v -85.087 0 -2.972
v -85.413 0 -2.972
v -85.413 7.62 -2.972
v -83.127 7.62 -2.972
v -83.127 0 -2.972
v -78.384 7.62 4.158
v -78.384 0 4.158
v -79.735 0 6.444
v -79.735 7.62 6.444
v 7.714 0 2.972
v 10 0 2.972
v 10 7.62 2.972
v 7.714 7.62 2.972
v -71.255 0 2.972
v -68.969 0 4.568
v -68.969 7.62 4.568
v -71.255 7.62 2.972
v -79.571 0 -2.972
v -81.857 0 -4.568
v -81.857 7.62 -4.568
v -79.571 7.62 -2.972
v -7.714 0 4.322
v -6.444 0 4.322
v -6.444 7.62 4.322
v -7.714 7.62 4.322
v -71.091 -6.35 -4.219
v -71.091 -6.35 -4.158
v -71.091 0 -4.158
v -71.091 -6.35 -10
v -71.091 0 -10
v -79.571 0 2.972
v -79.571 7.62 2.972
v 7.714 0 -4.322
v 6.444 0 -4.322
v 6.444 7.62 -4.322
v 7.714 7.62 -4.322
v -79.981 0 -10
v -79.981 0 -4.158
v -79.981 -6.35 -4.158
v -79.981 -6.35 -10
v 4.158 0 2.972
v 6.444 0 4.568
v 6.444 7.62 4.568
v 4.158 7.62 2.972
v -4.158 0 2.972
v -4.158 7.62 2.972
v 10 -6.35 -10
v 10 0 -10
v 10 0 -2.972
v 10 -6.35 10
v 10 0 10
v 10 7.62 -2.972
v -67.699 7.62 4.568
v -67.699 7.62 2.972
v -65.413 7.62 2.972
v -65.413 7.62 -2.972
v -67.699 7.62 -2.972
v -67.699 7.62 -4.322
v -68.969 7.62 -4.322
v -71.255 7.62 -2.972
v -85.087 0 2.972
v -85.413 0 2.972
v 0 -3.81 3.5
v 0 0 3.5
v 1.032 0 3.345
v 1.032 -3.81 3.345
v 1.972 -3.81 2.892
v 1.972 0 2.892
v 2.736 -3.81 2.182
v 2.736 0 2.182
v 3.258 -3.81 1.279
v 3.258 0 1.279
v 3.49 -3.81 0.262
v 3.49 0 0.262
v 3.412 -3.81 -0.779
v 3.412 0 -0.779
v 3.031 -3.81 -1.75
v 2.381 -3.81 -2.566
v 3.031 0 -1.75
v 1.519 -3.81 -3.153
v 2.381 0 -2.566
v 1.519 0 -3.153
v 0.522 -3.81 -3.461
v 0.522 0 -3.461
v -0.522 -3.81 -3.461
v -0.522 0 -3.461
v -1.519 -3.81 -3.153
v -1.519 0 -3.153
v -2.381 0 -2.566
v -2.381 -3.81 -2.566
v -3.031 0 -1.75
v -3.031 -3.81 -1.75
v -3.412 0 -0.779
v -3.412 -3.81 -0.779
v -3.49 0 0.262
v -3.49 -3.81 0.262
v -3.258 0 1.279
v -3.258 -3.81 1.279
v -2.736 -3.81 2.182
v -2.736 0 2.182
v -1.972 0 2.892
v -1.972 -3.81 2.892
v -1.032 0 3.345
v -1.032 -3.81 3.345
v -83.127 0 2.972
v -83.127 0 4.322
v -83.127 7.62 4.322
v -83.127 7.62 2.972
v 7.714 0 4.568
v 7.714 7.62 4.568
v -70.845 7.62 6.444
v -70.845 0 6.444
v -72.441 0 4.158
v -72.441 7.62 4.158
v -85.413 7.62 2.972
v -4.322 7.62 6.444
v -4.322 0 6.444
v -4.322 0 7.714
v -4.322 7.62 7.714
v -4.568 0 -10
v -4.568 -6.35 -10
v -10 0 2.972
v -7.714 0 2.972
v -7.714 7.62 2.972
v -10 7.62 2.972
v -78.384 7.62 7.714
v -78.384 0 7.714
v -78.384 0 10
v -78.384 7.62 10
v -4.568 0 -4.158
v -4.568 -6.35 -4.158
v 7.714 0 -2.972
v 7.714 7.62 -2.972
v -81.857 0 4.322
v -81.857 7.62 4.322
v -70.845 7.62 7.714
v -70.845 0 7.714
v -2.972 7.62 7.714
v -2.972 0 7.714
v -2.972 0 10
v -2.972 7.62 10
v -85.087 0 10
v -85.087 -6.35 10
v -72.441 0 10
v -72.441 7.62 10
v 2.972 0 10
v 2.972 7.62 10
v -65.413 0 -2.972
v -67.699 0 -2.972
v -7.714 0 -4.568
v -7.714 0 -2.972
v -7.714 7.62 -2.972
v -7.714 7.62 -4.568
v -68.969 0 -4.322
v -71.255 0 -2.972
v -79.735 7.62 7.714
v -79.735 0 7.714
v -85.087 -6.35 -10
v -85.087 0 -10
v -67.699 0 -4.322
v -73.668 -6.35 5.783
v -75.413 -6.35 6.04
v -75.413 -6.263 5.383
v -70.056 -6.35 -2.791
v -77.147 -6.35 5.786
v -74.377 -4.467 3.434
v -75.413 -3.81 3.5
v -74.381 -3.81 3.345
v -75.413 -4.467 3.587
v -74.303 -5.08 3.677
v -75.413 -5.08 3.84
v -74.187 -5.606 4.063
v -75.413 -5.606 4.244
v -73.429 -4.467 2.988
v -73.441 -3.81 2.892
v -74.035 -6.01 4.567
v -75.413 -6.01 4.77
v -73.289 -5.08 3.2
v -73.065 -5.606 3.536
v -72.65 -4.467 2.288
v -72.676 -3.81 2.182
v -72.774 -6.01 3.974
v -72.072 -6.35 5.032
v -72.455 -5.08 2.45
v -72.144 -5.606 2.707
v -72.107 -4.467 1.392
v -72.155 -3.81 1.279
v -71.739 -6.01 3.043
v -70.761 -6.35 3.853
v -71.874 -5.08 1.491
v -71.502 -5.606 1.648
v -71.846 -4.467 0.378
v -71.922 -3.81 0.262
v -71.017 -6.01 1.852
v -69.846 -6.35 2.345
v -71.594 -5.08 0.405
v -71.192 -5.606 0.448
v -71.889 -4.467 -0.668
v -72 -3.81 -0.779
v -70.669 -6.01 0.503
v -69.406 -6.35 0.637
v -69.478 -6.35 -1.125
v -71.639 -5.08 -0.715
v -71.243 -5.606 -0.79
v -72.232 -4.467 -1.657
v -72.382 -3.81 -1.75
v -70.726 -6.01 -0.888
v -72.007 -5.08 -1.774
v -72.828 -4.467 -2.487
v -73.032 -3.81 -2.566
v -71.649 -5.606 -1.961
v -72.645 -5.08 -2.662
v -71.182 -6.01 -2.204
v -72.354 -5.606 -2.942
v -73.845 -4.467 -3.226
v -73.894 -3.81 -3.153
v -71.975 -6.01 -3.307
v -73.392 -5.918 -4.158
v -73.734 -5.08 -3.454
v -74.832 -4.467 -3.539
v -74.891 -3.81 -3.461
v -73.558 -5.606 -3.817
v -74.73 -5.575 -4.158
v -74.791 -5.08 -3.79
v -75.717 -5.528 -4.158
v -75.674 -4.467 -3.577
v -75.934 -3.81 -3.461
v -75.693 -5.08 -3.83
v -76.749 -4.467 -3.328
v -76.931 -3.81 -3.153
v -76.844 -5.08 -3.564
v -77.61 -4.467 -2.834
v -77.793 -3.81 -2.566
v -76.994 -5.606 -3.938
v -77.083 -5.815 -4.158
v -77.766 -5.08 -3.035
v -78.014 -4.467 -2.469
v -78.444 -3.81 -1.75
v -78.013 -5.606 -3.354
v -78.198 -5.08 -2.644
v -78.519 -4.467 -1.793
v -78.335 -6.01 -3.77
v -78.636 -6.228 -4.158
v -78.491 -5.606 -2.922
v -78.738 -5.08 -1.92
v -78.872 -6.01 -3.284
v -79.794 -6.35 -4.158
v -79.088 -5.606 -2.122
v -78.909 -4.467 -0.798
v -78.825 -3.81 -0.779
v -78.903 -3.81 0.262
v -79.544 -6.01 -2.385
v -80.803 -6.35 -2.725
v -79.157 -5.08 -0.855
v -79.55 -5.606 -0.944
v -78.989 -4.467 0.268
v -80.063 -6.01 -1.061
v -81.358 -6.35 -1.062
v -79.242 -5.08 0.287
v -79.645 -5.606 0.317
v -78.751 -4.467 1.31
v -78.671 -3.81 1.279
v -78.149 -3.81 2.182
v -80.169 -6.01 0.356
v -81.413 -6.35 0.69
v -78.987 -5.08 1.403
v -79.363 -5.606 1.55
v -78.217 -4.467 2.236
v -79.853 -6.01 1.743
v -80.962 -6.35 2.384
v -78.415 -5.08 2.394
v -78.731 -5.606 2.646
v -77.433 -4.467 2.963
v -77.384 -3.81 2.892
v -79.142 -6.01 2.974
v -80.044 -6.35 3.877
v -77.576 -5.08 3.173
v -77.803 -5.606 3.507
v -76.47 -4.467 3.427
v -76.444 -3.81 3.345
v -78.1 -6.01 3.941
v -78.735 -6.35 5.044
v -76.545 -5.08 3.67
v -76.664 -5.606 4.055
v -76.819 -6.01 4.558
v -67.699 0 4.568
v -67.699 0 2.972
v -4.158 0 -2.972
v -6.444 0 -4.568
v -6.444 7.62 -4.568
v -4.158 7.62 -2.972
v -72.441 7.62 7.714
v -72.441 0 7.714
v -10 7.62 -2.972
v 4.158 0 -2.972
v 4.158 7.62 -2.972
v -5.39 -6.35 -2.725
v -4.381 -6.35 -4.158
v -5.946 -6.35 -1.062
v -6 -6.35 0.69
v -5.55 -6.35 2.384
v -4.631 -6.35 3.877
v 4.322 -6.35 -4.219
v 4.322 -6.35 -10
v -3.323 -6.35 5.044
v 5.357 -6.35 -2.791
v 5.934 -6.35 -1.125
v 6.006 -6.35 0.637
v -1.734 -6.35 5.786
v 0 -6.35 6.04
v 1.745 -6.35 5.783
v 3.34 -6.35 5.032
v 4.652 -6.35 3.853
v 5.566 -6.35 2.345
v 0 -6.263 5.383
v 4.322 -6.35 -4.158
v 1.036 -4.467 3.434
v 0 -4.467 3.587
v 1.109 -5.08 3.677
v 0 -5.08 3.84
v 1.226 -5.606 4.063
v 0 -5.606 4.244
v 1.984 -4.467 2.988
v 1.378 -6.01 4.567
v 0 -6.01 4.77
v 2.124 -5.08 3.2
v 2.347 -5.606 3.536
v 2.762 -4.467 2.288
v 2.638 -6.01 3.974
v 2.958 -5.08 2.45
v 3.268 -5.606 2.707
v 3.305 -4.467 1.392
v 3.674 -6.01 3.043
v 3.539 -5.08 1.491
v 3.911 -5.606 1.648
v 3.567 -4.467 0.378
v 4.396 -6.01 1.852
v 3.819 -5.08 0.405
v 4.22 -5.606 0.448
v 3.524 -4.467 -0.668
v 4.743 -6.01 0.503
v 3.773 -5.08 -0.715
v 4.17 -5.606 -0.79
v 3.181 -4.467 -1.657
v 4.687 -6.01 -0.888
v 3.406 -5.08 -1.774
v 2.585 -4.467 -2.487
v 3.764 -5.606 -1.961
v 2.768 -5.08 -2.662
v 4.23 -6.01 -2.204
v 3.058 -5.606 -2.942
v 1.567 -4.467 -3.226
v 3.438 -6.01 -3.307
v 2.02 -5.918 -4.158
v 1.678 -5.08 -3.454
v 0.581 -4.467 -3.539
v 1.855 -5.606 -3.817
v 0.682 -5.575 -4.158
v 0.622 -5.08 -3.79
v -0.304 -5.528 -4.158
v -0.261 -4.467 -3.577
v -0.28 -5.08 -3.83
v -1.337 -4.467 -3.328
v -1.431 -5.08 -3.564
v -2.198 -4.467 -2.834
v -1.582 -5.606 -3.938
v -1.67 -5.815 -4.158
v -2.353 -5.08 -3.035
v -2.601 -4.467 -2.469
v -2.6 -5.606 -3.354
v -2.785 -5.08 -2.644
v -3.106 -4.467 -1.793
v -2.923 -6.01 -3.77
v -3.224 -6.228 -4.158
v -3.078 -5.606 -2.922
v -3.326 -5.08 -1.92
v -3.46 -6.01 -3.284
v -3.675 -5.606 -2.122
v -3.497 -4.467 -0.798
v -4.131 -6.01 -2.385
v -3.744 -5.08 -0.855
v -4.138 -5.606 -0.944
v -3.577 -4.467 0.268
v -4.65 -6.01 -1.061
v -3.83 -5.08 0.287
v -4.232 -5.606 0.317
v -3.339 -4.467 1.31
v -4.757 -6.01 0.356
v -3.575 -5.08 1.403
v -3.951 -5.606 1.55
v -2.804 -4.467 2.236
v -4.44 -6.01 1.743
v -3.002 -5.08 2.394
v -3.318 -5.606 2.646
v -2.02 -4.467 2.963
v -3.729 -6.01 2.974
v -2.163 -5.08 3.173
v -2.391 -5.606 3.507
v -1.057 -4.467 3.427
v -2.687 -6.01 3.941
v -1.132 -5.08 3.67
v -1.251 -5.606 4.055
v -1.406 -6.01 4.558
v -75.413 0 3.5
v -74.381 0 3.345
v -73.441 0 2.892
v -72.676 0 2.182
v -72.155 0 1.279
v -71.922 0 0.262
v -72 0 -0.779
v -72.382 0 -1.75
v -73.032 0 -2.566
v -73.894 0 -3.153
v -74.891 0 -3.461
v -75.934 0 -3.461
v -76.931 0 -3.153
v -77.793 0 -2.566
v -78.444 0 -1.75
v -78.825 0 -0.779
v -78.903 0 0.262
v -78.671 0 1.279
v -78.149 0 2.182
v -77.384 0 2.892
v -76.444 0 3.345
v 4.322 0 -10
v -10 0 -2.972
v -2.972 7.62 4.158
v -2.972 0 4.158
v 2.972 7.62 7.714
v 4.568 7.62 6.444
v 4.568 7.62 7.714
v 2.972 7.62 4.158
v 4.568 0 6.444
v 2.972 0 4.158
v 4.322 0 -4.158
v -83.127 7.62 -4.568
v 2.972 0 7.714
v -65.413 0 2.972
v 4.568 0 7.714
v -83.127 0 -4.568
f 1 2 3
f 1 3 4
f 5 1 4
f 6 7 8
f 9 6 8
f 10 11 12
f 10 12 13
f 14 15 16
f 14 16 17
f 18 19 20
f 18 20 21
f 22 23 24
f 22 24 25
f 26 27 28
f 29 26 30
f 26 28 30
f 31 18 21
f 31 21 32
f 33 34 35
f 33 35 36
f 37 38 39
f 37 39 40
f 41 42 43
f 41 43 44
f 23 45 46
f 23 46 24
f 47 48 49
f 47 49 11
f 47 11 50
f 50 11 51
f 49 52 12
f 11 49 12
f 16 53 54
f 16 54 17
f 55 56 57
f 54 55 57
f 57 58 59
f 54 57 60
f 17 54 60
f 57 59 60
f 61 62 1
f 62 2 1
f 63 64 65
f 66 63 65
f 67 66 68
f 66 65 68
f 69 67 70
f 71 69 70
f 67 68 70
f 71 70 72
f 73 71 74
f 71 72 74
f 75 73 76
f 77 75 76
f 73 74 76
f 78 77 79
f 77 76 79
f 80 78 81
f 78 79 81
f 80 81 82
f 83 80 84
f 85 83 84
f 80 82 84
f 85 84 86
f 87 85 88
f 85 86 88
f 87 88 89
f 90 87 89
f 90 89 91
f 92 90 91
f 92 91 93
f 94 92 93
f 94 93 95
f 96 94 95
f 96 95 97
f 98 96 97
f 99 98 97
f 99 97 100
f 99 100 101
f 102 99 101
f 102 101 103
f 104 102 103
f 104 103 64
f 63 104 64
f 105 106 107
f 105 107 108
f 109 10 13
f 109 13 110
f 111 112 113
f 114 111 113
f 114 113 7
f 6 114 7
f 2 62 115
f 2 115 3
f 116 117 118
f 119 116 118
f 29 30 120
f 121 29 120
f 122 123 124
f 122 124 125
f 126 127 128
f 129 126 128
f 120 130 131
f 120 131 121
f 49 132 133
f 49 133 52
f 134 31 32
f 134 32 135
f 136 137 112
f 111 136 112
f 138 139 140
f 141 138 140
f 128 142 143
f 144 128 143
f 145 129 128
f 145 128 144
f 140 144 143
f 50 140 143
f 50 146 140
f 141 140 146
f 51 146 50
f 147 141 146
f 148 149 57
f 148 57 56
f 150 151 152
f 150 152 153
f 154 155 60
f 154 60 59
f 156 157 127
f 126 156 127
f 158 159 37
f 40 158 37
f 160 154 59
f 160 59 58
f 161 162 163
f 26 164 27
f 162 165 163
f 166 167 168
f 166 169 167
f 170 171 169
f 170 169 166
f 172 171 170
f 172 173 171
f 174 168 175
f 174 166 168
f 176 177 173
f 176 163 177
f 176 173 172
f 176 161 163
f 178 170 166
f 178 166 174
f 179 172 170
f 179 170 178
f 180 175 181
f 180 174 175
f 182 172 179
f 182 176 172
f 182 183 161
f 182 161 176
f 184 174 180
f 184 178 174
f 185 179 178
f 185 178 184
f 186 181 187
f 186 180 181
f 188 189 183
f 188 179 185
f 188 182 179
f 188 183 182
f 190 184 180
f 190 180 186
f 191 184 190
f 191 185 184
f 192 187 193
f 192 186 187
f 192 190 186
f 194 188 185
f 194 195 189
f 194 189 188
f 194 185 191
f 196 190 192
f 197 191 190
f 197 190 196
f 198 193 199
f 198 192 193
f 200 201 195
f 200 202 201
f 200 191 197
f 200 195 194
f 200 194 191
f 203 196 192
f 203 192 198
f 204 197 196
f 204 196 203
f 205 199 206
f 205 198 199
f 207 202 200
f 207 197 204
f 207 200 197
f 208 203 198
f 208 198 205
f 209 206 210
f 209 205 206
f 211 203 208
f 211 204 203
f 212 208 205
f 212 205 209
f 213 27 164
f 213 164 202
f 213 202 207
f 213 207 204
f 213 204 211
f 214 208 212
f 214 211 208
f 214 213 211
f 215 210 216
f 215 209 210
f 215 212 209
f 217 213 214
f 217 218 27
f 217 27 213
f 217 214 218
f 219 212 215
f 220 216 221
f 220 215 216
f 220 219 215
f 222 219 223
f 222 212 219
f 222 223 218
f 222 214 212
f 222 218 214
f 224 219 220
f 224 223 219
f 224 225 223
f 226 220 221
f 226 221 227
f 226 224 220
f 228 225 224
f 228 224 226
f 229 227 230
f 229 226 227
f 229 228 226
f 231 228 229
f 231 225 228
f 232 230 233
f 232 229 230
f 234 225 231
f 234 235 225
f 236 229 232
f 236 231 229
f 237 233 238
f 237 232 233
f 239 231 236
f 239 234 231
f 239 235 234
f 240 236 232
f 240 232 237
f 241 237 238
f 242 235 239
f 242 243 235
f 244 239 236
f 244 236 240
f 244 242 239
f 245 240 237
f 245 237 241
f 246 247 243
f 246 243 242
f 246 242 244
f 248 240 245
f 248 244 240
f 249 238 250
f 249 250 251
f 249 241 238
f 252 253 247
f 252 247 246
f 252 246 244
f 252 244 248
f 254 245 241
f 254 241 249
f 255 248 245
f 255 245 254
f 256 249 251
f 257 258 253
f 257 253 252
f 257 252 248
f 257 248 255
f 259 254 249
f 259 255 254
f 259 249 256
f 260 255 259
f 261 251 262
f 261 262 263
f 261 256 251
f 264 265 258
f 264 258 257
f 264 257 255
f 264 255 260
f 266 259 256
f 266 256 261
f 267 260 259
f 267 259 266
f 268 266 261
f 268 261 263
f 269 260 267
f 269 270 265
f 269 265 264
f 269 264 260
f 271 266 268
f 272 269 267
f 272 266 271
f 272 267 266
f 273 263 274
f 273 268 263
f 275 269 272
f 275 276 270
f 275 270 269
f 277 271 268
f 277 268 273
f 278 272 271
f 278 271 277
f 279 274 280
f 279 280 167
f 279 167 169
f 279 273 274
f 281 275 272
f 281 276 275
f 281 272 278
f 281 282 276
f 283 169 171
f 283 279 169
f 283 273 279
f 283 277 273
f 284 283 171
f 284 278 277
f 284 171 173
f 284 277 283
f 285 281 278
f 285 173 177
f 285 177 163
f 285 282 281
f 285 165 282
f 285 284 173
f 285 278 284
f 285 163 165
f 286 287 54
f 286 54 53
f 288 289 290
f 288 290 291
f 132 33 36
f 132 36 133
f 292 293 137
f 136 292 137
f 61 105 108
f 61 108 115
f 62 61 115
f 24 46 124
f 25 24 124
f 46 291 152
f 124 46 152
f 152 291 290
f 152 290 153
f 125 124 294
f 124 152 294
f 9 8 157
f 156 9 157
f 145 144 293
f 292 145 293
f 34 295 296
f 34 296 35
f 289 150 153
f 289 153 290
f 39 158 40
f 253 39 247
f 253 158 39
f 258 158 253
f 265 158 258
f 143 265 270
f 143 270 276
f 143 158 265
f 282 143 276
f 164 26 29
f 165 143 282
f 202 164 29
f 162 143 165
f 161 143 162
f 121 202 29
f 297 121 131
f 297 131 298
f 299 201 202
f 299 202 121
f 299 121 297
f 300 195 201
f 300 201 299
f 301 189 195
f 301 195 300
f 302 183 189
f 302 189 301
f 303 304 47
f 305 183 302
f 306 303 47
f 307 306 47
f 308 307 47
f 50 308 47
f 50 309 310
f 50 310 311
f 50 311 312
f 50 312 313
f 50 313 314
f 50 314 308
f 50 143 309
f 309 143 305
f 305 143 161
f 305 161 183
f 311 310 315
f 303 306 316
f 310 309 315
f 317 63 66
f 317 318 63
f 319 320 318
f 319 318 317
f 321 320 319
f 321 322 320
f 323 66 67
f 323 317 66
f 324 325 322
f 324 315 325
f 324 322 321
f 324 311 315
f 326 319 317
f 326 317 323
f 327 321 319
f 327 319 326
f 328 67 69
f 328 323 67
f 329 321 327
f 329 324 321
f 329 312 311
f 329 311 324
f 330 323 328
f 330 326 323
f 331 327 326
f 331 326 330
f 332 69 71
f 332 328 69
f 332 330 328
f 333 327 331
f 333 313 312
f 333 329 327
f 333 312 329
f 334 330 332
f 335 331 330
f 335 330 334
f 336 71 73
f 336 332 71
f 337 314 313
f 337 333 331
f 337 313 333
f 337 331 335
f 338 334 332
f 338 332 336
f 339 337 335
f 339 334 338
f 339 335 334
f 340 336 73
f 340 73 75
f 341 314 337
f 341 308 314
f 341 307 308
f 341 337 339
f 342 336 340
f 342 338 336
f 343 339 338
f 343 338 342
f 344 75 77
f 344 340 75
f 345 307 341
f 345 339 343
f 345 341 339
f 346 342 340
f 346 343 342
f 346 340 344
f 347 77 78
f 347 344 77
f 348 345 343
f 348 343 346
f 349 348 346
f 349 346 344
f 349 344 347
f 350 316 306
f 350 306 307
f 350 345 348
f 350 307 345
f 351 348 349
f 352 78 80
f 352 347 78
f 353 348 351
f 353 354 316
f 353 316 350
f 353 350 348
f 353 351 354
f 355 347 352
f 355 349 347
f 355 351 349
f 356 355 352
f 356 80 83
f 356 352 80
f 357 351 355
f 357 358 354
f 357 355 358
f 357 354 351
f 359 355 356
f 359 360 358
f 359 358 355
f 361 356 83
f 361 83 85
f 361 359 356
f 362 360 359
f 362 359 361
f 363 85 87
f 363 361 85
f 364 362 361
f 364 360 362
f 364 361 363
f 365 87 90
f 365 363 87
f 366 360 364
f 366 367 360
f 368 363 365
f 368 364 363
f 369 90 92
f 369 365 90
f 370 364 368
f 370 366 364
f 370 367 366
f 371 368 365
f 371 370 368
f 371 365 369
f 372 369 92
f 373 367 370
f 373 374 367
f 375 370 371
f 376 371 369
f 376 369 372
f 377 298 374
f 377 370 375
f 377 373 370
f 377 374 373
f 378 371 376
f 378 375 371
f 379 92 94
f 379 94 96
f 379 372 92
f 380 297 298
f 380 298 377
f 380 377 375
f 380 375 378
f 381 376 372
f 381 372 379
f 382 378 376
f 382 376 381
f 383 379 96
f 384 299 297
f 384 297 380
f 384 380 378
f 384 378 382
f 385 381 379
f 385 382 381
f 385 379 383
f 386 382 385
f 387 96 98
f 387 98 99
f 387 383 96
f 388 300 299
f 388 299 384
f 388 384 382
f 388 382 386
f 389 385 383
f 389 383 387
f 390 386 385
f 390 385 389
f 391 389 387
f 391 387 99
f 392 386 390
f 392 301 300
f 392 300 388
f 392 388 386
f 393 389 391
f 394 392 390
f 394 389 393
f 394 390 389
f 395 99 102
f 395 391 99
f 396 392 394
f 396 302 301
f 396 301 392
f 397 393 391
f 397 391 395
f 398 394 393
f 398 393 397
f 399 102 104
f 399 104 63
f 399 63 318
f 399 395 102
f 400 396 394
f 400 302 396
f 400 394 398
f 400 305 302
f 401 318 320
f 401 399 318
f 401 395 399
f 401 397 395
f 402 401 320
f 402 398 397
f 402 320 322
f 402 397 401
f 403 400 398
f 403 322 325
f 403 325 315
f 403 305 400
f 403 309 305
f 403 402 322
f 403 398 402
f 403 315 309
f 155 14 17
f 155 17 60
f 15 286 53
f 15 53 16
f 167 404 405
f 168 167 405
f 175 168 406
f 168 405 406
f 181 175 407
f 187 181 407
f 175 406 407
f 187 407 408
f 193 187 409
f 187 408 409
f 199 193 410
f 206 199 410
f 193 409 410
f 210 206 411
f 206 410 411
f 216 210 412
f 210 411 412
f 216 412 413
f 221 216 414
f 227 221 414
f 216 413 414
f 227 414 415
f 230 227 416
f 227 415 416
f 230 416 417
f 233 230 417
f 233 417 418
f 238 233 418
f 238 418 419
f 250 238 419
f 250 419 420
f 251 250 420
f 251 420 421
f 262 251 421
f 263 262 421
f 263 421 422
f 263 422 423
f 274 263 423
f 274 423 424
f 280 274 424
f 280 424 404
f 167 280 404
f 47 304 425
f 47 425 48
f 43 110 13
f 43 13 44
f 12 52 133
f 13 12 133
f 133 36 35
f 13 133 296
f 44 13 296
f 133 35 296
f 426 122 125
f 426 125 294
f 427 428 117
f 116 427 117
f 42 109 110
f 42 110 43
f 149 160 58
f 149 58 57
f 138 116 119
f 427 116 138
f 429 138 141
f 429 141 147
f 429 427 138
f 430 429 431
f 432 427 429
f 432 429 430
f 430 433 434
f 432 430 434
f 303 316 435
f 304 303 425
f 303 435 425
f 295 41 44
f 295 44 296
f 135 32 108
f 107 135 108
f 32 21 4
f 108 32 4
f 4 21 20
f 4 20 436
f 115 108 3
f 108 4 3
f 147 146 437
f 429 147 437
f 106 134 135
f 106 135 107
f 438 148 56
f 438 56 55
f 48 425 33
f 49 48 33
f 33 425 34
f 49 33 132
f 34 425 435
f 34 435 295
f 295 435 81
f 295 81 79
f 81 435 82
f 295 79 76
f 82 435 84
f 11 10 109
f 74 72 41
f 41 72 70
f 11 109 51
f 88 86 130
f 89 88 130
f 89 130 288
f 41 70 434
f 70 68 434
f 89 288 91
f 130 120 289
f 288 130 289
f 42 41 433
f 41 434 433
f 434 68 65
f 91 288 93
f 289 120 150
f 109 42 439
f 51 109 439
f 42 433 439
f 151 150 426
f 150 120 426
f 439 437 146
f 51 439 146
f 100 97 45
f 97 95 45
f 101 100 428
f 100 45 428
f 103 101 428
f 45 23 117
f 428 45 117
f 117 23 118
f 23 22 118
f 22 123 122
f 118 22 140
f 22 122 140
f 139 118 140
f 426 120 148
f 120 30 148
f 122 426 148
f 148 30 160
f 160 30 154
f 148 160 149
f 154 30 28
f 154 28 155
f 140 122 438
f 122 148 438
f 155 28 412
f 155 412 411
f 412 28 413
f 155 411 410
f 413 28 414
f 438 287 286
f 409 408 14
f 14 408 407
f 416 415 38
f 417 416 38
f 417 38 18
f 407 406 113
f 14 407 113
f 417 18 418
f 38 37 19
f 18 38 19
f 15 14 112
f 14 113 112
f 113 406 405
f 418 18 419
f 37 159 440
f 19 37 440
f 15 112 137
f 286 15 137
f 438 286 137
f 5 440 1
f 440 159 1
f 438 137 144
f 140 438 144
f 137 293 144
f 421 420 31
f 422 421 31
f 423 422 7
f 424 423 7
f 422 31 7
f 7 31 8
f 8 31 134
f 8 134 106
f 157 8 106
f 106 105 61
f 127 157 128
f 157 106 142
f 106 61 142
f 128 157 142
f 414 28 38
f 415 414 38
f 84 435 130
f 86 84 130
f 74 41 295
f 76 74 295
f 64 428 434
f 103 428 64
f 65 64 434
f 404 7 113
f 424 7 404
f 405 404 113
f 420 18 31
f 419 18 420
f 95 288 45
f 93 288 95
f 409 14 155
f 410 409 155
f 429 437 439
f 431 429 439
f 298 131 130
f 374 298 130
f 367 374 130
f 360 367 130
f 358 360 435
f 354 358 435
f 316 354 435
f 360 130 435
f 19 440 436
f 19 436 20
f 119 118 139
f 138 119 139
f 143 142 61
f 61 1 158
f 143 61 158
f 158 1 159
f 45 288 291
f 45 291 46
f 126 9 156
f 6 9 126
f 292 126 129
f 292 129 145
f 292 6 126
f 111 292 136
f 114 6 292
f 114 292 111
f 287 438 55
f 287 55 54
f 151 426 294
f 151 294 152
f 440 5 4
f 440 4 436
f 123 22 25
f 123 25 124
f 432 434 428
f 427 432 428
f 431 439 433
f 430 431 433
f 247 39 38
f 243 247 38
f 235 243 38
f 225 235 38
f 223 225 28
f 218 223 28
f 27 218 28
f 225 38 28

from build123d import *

# Parameters (mm, degrees)
BOSS_EXTRUDE1_DEPTH   = 7.62
BOSS_EXTRUDE1_2_DEPTH = 7.62
BOSS_EXTRUDE1_3_DEPTH = 7.62
BOSS_EXTRUDE1_4_DEPTH = 7.62
SKETCH2_W             = 132.9538108
SKETCH2_H             = 20
BOSS_EXTRUDE2_DEPTH   = 6.35
LPATTERN2_COUNT       = 2
LPATTERN2_PITCH       = 75.4126
CUT_EXTRUDE1_DEPTH    = 125.148300392
FILLET1_R             = 2.54
SKETCH13_R            = 3.5
CUT_EXTRUDE5_DEPTH    = 124.59491895
FILLET6_R             = 2.54
SKETCH14_W            = 8.89
SKETCH14_H            = 5.842
CUT_EXTRUDE6_DEPTH    = 125.148300392
SKETCH15_W            = 25.4
SKETCH15_H            = 40.894
BOSS_EXTRUDE3_DEPTH   = 12.7
FILLET15_R            = 10.16
FILLET16_R            = 10.16
FILLET17_R            = 10.16
FILLET18_R            = 10.16
SKETCH18_R            = 1.984375
CUT_EXTRUDE9_DEPTH    = 12.7
SKETCH19_W            = 37.866917971
SKETCH19_H            = 35.1892
CUT_EXTRUDE10_DEPTH   = 133.001722138


with BuildPart() as part:
    # Sketch1 → Boss-Extrude1 (new body)
    with BuildSketch(Plane(origin=(0, 0, 0), x_dir=(1, 0, 0), z_dir=(0, 1, 0))):
        Polygon((2.9718, 10), (-2.9718, 10), (-2.9718, 7.714), (-4.567901235, 7.714), (-4.567901235, 6.444), (-2.9718, 4.158), (2.9718, 4.158), (4.322098765, 6.444), (4.322098765, 7.714), (2.9718, 7.714), align=None)
    boss_extrude1 = extrude(amount=BOSS_EXTRUDE1_DEPTH)



with BuildPart() as body_2:
    # Sketch1 → Boss-Extrude1 2 (new body)
    with BuildSketch(Plane(origin=(0, 0, 0), x_dir=(1, 0, 0), z_dir=(0, 1, 0))):
        Polygon((4.158, -2.9718), (4.158, 2.9718), (6.444, 4.322098765), (7.714, 4.322098765), (7.714, 2.9718), (10, 2.9718), (10, -2.9718), (7.714, -2.9718), (7.714, -4.567901235), (6.444, -4.567901235), align=None)
    boss_extrude1_2 = extrude(amount=BOSS_EXTRUDE1_2_DEPTH)


with BuildPart() as body_3:
    # Sketch1 → Boss-Extrude1 3 (new body)
    with BuildSketch(Plane(origin=(0, 0, 0), x_dir=(1, 0, 0), z_dir=(0, 1, 0))):
        Polygon((-10, -2.9718), (-10, 2.9718), (-7.714, 2.9718), (-7.714, 4.567901235), (-6.444, 4.567901235), (-4.158, 2.9718), (-4.158, -2.9718), (-6.444, -4.322098765), (-7.714, -4.322098765), (-7.714, -2.9718), align=None)
    boss_extrude1_3 = extrude(amount=BOSS_EXTRUDE1_3_DEPTH)


with BuildPart() as body_4:
    # Sketch1 → Boss-Extrude1 4 (new body)
    with BuildSketch(Plane(origin=(0, 0, 0), x_dir=(1, 0, 0), z_dir=(0, 1, 0))):
        Polygon((4.567901235, -6.444), (2.9718, -4.158), (-2.9718, -4.158), (-4.322098765, -6.444), (-4.322098765, -7.714), (-2.9718, -7.714), (-2.9718, -10), (2.9718, -10), (2.9718, -7.714), (4.567901235, -7.714), align=None)
    boss_extrude1_4 = extrude(amount=BOSS_EXTRUDE1_4_DEPTH)


with BuildPart() as part_1:
    add(part.part)

    add(body_2.part)  # Boss-Extrude2 merges body 2

    add(body_3.part)  # Boss-Extrude2 merges body 3

    add(body_4.part)  # Boss-Extrude2 merges body 4
    # Sketch2 → Boss-Extrude2 (add)
    with BuildSketch(Plane.XZ):
        with Locations((-56.4769054, 0)):
            Rectangle(SKETCH2_W, SKETCH2_H)
    extrude(amount=BOSS_EXTRUDE2_DEPTH)

    # LPattern2: Boss-Extrude1, Boss-Extrude1 2, Boss-Extrude1 3, Boss-Extrude1 4 ×2
    with Locations(*[(-i * LPATTERN2_PITCH, 0, 0) for i in range(1, LPATTERN2_COUNT)]):
        add(boss_extrude1)
        add(boss_extrude1_2)
        add(boss_extrude1_3)
        add(boss_extrude1_4)

    # Sketch4 → Cut-Extrude1 (cut, through all)
    with BuildSketch(Plane(origin=(0, -6.35, 0), x_dir=(-1, 0, 0), z_dir=(0, -1, 0))):
        Polygon((122.9538108, -10), (85.4126108, -10), (122.9538108, -0.2108), align=None)
    extrude(amount=-CUT_EXTRUDE1_DEPTH, mode=Mode.SUBTRACT)

    # Fillet1
    fillet1_edges = [part_1.edges().sort_by_distance(p)[0] for p in [
        (-85.4126108, -3.175, 10),
    ]]
    fillet(fillet1_edges, radius=FILLET1_R)

    # Sketch13 → Cut-Extrude5 (cut, through all)
    with BuildSketch(Plane(origin=(0, 0, 0), x_dir=(1, 0, 0), z_dir=(0, 1, 0))):
        with Locations(Location((0, 0, 0), (0, 0, 270))):
            Circle(SKETCH13_R)
        with Locations(Location((-75.4126, 0, 0), (0, 0, 270))):
            Circle(SKETCH13_R)
    extrude(amount=-CUT_EXTRUDE5_DEPTH, mode=Mode.SUBTRACT)

    # Fillet6
    fillet6_edges = [part_1.edges().sort_by_distance(p)[0] for p in [
        (0, -6.35, -3.5),
        (-75.4126, -6.35, -3.5),
    ]]
    fillet(fillet6_edges, radius=FILLET6_R)

    # Sketch14 → Cut-Extrude6 (cut, through all)
    with BuildSketch(Plane(origin=(0, 7.62, 0), x_dir=(1, 0, 0), z_dir=(0, 1, 0))):
        with Locations((-0.122901235, 7.079)):
            Rectangle(SKETCH14_W, SKETCH14_H)
        with Locations((-75.535501235, 7.079)):
            Rectangle(SKETCH14_W, SKETCH14_H)
    extrude(amount=-CUT_EXTRUDE6_DEPTH, mode=Mode.SUBTRACT)

    # Sketch15 → Boss-Extrude3 (add)
    with BuildSketch(Plane.ZY.offset(122.9538108)):
        with Locations((-12.4892, -20.447)):
            Rectangle(SKETCH15_W, SKETCH15_H)
    extrude(amount=-BOSS_EXTRUDE3_DEPTH)

    # Fillet15
    fillet15_edges = [part_1.edges().sort_by_distance(p)[0] for p in [
        (-110.2538108, -6.35, -4.8946),
    ]]
    fillet(fillet15_edges, radius=FILLET15_R)

    # Fillet16
    fillet16_edges = [part_1.edges().sort_by_distance(p)[0] for p in [
        (-110.2538108, -8.255, -10),
    ]]
    fillet(fillet16_edges, radius=FILLET16_R)

    # Fillet17
    fillet17_edges = [part_1.edges().sort_by_distance(p)[0] for p in [
        (-110.2538108, -40.894, -12.4892),
    ]]
    fillet(fillet17_edges, radius=FILLET17_R)

    # Fillet18
    fillet18_edges = [part_1.edges().sort_by_distance(p)[0] for p in [
        (-107.278015697, -9.325795103, 0.2108),
        (-121.6838108, -40.894, 0.2108),
        (-110.2538108, -23.622, 0.2108),
        (-113.229605903, -37.918204897, 0.2108),
    ]]
    fillet(fillet18_edges, radius=FILLET18_R)

    # Sketch18 → Cut-Extrude9 (cut)
    with BuildSketch(Plane.ZY.offset(122.9538108)):
        with Locations((-12.4892, -28.194)):
            Circle(SKETCH18_R)
    extrude(amount=-CUT_EXTRUDE9_DEPTH, mode=Mode.SUBTRACT)

    # Sketch19 → Cut-Extrude10 (cut, through all)
    with BuildSketch(Plane(origin=(0, 0, 0), x_dir=(1, 0, 0), z_dir=(0, 1, 0))):
        with Locations((-104.020351815, 7.5946)):
            Rectangle(SKETCH19_W, SKETCH19_H)
    extrude(amount=-CUT_EXTRUDE10_DEPTH, mode=Mode.SUBTRACT)


solid = part_1.part
